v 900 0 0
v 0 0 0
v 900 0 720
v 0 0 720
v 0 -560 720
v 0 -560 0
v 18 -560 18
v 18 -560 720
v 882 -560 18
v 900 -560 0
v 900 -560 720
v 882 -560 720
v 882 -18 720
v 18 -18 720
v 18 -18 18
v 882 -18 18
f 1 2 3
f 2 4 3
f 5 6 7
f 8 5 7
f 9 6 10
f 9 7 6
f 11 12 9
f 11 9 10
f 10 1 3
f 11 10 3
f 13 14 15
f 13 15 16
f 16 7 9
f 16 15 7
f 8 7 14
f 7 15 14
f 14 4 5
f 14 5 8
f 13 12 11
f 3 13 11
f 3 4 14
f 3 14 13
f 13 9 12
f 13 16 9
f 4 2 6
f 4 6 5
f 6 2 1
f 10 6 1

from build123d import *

# Parameters (mm, degrees)
F0_W     = 51.5153110027
F0_H     = 46.9279363751
F1_DEPTH = 560
F2_DEPTH = 900
F3_DEPTH = 720
F4_T     = -18


with BuildPart() as f1:
    # F0 (on Front) → F1 (new body)
    with BuildSketch(Plane.XZ):
        with Locations((25.7576555014, 23.4639681876)):
            Rectangle(F0_W, F0_H)
    extrude(amount=F1_DEPTH)

    # F2 (add): a face of the model
    f2_faces = [f1.faces().sort_by_distance(p)[0] for p in [
        (0, -280, 23.4639681876),
    ]]
    extrude(f2_faces, amount=-F2_DEPTH)

    # F3 (add): a face of the model
    f3_faces = [f1.faces().sort_by_distance(p)[0] for p in [
        (450, -280, 0),
    ]]
    extrude(f3_faces, amount=-F3_DEPTH)

    # F4
    f4_openings = [f1.faces().sort_by_distance(p)[0] for p in [
        (450, -560, 360),
        (450, -280, 720),
    ]]
    offset(amount=F4_T, openings=f4_openings)


solid = f1.part
